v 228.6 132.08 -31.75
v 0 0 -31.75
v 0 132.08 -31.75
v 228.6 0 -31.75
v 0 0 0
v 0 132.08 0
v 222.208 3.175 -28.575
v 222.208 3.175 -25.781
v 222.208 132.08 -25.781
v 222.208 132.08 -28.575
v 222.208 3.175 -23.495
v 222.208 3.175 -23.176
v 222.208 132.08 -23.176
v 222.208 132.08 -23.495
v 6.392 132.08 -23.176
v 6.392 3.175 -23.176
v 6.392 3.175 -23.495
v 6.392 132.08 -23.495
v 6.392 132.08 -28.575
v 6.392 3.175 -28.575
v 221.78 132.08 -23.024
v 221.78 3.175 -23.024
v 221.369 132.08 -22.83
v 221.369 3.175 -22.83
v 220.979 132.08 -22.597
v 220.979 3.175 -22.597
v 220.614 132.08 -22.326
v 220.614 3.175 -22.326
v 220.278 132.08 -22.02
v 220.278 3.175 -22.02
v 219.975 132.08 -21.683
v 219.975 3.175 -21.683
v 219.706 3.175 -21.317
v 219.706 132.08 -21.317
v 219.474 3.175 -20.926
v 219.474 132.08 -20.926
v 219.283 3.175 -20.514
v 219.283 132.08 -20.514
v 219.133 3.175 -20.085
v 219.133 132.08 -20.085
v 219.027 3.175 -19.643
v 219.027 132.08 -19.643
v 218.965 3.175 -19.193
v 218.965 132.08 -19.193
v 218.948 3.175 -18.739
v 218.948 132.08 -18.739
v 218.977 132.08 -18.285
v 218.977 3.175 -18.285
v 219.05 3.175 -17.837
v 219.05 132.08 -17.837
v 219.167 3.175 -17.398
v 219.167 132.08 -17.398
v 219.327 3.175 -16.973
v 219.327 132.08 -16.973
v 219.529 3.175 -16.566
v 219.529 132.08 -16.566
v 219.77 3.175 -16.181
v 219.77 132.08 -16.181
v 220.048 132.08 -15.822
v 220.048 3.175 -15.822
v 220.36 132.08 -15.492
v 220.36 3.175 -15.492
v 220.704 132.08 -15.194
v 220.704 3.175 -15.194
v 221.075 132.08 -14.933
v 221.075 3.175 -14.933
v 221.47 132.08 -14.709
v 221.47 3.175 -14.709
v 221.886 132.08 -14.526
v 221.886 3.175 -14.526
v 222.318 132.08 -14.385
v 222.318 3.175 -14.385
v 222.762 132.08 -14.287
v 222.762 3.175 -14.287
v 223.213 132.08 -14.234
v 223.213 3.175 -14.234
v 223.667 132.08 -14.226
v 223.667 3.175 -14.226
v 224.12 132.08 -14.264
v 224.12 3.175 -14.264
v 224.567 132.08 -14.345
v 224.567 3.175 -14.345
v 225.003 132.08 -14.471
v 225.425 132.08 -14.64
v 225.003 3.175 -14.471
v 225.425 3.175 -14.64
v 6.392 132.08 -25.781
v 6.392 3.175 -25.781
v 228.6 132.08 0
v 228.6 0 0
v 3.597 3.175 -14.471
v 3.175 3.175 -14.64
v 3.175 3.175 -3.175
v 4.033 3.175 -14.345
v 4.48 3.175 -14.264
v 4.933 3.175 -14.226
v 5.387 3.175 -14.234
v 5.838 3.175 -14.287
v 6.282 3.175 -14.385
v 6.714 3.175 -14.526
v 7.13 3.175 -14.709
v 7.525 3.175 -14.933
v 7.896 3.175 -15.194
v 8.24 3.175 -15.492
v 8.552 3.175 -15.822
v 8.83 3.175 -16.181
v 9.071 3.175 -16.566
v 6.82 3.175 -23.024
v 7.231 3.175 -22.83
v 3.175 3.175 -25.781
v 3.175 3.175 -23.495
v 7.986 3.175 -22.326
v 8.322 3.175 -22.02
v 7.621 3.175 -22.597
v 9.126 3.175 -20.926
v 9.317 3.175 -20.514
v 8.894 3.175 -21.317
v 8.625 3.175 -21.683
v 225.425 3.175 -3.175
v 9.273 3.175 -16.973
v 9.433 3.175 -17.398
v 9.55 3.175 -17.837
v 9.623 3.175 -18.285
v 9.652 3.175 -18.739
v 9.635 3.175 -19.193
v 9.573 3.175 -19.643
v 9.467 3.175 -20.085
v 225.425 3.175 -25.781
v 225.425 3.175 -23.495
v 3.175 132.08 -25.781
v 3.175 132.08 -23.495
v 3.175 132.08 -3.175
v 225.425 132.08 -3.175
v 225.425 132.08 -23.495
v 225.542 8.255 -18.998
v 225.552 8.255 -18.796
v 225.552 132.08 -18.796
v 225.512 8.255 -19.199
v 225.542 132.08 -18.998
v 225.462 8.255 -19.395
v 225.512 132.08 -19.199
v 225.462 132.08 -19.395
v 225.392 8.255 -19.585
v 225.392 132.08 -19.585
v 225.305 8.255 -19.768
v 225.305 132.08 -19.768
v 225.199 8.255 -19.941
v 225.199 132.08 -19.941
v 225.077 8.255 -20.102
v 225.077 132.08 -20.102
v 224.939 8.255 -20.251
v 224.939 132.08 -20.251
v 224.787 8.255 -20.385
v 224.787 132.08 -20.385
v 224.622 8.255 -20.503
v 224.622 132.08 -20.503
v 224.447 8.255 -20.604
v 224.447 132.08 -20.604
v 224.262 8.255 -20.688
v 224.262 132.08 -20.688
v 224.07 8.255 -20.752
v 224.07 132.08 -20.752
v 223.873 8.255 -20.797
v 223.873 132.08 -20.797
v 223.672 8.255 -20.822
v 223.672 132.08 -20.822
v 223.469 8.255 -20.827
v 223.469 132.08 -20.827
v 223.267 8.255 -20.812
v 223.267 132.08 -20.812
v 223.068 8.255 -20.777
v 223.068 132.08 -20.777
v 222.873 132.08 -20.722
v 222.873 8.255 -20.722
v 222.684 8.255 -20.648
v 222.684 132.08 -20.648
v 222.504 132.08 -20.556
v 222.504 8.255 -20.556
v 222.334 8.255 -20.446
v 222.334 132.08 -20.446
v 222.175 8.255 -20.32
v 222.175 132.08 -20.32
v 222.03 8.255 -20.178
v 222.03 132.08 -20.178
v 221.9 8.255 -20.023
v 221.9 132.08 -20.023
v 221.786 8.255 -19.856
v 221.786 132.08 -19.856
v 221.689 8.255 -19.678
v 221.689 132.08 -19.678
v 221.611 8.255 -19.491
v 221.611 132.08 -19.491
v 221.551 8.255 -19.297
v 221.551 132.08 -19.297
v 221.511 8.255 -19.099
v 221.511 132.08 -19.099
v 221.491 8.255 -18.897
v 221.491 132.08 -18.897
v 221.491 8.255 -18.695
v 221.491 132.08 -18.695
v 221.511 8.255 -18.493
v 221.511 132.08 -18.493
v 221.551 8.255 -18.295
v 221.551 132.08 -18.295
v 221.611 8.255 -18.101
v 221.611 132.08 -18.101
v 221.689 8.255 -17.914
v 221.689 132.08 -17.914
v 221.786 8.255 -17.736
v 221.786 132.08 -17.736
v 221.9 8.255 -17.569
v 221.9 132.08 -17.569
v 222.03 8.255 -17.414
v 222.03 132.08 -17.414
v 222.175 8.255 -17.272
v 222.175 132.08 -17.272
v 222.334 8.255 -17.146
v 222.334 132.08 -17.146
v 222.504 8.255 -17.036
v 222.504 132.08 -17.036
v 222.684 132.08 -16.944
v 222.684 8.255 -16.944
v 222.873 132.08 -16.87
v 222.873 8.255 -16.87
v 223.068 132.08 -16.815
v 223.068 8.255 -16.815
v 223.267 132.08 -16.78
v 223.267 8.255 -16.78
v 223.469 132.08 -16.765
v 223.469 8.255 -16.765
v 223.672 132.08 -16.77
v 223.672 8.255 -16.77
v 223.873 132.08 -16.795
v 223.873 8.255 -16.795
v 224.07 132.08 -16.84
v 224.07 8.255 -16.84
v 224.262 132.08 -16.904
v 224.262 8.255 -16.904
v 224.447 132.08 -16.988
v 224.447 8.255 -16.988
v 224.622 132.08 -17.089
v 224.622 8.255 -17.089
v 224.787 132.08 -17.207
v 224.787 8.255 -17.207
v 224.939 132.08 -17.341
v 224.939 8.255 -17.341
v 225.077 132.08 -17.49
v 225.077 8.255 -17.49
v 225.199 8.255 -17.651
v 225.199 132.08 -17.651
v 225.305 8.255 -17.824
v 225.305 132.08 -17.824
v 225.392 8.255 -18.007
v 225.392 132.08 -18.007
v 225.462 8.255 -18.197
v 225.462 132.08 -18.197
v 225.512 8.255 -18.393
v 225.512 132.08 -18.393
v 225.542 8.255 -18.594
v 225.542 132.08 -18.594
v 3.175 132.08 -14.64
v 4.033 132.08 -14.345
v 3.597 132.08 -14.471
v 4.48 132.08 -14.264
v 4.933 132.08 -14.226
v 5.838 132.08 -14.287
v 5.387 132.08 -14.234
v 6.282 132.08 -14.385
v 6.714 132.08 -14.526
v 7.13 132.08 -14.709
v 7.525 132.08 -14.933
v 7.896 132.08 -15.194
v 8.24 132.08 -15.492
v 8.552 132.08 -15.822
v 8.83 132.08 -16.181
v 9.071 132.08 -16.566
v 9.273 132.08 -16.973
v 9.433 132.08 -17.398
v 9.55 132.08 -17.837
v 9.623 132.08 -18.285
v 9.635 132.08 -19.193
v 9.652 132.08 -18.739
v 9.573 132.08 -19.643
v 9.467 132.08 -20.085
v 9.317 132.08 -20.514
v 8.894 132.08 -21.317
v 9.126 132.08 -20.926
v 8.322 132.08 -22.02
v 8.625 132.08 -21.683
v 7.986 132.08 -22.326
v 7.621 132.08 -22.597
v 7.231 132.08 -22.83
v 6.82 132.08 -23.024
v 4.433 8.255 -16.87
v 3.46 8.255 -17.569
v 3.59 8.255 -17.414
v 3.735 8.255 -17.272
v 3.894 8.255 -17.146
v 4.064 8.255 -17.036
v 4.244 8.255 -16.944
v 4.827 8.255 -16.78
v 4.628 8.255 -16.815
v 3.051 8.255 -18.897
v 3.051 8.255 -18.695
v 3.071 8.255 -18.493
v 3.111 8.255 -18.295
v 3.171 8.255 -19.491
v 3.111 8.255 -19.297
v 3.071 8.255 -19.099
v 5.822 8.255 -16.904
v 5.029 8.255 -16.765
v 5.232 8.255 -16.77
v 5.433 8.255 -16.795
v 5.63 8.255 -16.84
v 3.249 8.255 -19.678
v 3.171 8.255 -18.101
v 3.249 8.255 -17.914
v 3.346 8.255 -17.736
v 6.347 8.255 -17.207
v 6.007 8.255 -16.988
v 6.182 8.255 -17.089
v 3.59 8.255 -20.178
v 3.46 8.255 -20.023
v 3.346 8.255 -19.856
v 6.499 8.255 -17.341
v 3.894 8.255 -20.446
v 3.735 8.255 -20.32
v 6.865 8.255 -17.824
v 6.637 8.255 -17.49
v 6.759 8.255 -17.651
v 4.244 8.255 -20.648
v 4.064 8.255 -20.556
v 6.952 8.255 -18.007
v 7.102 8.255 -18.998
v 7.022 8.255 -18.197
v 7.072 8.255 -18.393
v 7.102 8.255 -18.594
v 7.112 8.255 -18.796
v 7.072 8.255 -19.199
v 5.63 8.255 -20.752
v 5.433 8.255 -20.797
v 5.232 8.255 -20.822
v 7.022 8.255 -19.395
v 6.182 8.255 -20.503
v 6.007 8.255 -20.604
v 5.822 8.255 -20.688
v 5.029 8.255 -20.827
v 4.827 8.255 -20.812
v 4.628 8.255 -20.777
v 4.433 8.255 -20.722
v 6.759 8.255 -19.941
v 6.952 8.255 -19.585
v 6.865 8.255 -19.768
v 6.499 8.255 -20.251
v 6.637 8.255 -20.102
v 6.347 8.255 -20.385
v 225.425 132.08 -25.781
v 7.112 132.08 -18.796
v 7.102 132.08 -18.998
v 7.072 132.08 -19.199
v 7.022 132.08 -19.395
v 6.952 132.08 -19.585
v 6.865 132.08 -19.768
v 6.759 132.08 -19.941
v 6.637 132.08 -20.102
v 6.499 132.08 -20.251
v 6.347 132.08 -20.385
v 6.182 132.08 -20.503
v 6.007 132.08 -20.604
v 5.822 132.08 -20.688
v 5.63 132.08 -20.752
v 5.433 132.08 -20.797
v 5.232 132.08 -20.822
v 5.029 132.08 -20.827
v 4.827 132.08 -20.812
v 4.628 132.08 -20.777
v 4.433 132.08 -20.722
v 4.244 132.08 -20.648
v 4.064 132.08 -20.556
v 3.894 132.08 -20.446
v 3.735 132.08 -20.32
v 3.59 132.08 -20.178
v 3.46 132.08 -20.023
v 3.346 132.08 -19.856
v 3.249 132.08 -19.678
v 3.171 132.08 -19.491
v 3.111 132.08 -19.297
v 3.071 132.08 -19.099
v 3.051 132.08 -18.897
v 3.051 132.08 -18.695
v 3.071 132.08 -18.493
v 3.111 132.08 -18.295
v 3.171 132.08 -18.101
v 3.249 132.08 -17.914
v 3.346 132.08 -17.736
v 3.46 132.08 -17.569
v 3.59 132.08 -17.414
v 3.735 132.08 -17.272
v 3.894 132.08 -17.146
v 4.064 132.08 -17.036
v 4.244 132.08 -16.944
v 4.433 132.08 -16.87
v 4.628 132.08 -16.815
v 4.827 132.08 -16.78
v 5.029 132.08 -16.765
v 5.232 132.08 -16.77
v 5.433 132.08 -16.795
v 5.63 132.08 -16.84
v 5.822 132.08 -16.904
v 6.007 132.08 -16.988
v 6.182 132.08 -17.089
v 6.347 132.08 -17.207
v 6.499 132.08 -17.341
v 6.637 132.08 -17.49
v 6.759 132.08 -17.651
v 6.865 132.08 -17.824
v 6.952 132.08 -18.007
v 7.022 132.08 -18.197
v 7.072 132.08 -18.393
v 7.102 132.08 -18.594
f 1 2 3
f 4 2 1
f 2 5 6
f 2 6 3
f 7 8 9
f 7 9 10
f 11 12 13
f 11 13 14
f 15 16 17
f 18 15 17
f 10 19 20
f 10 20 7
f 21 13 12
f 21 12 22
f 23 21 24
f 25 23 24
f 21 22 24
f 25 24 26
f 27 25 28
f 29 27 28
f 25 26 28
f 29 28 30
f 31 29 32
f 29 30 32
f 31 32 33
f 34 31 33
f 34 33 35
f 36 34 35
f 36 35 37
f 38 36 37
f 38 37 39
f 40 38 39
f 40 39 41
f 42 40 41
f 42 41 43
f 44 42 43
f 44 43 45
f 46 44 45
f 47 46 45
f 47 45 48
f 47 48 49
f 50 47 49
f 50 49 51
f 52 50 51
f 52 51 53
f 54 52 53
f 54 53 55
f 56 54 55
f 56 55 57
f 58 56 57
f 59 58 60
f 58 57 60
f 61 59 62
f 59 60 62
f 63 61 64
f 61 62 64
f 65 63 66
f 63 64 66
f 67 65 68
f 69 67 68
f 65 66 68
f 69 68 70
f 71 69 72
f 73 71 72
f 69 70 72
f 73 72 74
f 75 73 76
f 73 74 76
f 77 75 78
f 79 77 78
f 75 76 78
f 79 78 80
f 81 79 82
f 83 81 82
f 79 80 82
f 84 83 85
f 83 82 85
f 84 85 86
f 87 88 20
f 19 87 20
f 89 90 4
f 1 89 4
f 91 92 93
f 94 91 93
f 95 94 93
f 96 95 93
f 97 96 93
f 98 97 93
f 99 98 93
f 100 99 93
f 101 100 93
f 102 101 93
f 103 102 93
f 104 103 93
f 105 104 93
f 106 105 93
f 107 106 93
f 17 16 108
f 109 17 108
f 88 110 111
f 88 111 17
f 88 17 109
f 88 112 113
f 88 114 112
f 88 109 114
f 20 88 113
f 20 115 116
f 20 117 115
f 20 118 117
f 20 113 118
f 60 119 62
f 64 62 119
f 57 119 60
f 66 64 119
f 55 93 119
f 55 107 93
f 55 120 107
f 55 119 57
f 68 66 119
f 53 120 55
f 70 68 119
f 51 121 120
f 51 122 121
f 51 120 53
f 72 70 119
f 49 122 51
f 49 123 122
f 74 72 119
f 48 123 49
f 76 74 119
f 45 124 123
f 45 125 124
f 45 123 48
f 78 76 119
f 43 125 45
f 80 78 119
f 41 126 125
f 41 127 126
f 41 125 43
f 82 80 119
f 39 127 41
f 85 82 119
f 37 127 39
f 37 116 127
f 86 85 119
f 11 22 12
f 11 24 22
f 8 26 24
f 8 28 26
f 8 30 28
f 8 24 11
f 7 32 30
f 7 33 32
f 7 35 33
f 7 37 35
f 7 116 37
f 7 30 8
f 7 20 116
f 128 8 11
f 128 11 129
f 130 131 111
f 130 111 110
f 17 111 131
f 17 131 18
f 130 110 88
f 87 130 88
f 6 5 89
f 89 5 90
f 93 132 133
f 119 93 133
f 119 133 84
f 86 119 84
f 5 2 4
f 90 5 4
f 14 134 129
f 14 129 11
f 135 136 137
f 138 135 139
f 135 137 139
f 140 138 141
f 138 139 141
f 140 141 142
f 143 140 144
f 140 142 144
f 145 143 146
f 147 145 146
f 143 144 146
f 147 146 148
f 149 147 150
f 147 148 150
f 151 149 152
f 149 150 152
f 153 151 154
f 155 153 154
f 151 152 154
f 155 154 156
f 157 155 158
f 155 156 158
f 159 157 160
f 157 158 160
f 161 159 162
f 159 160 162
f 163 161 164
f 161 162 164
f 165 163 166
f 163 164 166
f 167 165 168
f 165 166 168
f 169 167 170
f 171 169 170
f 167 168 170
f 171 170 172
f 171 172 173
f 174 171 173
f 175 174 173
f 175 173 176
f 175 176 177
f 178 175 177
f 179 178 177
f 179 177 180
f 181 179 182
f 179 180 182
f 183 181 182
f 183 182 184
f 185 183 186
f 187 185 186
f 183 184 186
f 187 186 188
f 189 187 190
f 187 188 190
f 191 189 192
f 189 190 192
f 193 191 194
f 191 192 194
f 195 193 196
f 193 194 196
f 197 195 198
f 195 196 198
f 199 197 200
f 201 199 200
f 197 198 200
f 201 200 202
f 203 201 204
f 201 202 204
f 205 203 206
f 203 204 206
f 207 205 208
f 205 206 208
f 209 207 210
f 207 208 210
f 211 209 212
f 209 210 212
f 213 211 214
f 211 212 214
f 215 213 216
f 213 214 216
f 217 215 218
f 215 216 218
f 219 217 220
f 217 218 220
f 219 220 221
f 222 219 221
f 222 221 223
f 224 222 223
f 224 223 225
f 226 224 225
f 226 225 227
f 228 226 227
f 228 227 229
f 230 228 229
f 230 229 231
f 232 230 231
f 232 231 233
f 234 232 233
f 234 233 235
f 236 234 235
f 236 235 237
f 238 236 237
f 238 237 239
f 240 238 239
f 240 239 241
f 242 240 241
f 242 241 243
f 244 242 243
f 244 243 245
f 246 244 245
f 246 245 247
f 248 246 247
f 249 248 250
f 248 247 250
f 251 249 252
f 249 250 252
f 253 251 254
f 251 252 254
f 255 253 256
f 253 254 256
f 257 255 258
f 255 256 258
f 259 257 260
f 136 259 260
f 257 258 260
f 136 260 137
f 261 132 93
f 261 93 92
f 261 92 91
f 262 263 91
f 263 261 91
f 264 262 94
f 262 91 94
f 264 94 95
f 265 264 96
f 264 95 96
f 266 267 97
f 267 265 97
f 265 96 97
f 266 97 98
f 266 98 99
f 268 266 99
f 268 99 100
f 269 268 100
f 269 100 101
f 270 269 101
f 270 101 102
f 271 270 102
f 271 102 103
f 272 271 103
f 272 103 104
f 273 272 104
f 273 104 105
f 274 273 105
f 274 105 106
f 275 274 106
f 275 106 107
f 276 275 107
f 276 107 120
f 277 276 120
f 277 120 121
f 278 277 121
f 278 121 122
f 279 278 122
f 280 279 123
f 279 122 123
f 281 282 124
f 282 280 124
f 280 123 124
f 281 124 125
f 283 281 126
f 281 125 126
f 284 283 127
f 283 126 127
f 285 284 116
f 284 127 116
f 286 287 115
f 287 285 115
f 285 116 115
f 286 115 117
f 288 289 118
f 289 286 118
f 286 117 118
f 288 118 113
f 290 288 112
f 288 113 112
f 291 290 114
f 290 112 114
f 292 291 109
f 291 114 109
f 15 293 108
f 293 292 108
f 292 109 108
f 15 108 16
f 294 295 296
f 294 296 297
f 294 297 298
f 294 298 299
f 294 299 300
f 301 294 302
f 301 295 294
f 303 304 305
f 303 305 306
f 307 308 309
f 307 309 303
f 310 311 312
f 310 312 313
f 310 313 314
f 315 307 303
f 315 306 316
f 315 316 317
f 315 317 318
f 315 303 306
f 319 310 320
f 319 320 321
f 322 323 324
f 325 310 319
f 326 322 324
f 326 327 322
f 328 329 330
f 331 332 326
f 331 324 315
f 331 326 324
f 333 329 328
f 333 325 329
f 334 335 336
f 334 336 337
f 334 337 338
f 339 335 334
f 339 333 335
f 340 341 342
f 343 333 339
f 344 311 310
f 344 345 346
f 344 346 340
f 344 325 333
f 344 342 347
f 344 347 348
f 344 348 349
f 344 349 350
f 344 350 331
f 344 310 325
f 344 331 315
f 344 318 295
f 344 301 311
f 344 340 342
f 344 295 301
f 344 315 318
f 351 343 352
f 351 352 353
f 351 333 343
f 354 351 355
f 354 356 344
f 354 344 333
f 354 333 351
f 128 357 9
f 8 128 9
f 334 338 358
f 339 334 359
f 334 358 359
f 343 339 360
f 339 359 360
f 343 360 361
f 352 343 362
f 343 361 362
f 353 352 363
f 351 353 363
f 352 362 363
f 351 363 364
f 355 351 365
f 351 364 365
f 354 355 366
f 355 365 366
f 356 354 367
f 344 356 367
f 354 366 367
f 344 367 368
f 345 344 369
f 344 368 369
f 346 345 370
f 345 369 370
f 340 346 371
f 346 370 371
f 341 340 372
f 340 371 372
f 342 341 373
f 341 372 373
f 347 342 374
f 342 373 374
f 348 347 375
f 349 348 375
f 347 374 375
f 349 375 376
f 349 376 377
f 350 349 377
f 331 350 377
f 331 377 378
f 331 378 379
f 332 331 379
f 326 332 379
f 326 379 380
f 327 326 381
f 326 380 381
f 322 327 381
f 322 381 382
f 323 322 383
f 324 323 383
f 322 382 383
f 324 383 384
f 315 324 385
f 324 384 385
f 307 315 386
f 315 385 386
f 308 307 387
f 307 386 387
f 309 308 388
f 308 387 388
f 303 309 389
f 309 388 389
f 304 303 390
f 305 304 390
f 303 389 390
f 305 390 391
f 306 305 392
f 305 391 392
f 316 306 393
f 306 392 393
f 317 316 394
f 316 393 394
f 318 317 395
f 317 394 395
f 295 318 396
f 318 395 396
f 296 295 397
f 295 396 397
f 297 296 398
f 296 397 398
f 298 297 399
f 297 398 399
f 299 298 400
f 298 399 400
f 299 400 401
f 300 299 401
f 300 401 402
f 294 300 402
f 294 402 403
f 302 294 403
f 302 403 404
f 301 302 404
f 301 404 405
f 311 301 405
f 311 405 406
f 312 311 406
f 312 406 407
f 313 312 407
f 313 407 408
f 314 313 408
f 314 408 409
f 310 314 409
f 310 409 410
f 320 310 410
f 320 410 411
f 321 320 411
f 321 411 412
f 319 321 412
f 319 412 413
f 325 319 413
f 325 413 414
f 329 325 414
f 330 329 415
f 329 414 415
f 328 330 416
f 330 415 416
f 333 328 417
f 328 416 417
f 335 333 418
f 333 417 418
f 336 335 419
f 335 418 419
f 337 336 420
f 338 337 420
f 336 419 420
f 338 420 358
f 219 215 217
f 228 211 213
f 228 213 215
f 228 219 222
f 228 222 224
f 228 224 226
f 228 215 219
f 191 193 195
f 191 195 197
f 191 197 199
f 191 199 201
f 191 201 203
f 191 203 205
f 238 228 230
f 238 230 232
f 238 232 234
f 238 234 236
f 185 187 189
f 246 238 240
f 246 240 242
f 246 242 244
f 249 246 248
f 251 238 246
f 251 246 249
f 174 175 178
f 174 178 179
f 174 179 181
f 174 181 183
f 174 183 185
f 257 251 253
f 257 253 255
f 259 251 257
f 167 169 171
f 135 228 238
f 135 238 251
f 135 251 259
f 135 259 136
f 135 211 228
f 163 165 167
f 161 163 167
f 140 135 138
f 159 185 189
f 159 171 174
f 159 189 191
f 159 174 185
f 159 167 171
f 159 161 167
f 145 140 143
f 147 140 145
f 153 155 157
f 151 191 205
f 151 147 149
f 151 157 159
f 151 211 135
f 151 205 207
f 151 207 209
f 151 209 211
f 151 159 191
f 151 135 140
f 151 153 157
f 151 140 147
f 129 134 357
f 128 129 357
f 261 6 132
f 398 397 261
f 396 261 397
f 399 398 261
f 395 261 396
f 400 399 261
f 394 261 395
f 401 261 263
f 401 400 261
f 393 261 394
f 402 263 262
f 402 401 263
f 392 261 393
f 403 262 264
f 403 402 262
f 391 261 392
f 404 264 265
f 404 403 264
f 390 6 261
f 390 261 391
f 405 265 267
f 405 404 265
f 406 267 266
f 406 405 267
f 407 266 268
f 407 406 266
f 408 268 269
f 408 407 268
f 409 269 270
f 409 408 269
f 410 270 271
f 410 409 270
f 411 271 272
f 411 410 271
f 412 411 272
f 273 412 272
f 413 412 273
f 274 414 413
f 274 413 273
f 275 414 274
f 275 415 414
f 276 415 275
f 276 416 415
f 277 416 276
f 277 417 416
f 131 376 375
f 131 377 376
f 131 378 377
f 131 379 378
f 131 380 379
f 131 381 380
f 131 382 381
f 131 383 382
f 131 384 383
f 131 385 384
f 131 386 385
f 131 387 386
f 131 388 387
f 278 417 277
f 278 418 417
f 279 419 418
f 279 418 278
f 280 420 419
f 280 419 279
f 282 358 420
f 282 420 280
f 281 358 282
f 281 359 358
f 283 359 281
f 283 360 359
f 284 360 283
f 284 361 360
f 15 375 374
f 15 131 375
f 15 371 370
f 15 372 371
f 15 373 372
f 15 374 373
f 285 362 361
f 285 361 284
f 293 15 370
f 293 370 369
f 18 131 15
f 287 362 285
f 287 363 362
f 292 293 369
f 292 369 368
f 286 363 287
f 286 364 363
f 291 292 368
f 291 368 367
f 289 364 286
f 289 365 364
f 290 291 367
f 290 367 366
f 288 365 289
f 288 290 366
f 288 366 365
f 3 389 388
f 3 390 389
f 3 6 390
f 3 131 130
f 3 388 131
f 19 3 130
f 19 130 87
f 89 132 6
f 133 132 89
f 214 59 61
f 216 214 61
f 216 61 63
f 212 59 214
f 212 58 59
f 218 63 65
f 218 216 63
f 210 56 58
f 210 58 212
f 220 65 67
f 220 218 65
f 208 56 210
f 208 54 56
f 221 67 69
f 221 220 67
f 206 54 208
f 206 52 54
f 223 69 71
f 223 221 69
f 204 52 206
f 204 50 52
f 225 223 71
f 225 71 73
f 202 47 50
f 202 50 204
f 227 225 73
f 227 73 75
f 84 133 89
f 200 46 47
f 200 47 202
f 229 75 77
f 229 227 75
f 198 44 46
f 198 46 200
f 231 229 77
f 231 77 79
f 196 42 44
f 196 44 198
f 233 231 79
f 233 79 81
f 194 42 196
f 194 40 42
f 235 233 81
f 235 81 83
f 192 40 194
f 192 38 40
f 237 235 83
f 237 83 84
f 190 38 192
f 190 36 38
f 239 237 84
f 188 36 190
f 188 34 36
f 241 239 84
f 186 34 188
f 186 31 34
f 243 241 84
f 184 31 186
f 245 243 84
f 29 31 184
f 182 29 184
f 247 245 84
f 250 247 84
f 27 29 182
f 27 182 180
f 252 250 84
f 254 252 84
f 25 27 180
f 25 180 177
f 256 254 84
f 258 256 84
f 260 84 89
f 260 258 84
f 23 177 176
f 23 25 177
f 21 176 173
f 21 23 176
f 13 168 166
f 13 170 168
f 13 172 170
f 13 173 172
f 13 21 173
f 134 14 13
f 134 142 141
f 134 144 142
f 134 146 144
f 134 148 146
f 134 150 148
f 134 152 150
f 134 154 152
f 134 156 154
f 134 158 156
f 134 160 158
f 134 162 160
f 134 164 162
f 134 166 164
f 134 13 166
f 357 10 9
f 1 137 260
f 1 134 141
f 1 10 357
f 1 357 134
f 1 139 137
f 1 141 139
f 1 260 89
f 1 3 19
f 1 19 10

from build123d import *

# Parameters (mm, degrees)
SKETCH1_W           = 228.6
SKETCH1_H           = 31.75
BOSS_EXTRUDE1_DEPTH = 132.08
SKETCH2_W           = 222.25
SKETCH2_H           = 25.4
CUT_EXTRUDE1_DEPTH  = 128.905
SKETCH3_W           = 3.216999687
SKETCH3_H           = 4.15103562
SKETCH3_H_2         = 5.08
BOSS_EXTRUDE2_DEPTH = 128.905
SKETCH4_R           = 4.572
BOSS_EXTRUDE3_DEPTH = 128.905
SKETCH5_R           = 2.032
CUT_EXTRUDE2_DEPTH  = 123.825


with BuildPart() as part:
    # Sketch1 → Boss-Extrude1 (new body)
    with BuildSketch(Plane(origin=(0, 0, 0), x_dir=(1, 0, 0), z_dir=(0, 1, 0))):
        with Locations((114.3, 15.875)):
            Rectangle(SKETCH1_W, SKETCH1_H)
    extrude(amount=BOSS_EXTRUDE1_DEPTH)

    # Sketch2 → Cut-Extrude1 (cut)
    with BuildSketch(Plane(origin=(0, 132.08, 0), x_dir=(1, 0, 0), z_dir=(0, 1, 0))):
        with Locations((114.3, 15.875)):
            Rectangle(SKETCH2_W, SKETCH2_H)
    extrude(amount=-CUT_EXTRUDE1_DEPTH, mode=Mode.SUBTRACT)

    # Sketch3 → Boss-Extrude2 (add)
    with BuildSketch(Plane(origin=(0, 3.175, 0), x_dir=(1, 0, 0), z_dir=(0, 1, 0))):
        with Locations((4.783499844, 27.85651781)):
            Rectangle(SKETCH3_W, SKETCH3_H)
        with Locations((4.783499844, 20.955)):
            Rectangle(SKETCH3_W, SKETCH3_H_2)
    boss_extrude2 = extrude(amount=BOSS_EXTRUDE2_DEPTH)

    # Mirror1: Boss-Extrude2 across plane
    add(boss_extrude2.mirror(Plane.ZY.offset(-114.3)))

    # Sketch4 → Boss-Extrude3 (add)
    with BuildSketch(Plane(origin=(0, 3.175, 0), x_dir=(1, 0, 0), z_dir=(0, 1, 0))):
        with Locations((5.08, 18.796)):
            Circle(SKETCH4_R)
        with Locations((223.52, 18.796)):
            Circle(SKETCH4_R)
    extrude(amount=BOSS_EXTRUDE3_DEPTH)

    # Sketch5 → Cut-Extrude2 (cut)
    with BuildSketch(Plane(origin=(0, 132.08, 0), x_dir=(1, 0, 0), z_dir=(0, 1, 0))):
        with Locations((5.08, 18.796)):
            Circle(SKETCH5_R)
        with Locations((223.52, 18.796)):
            Circle(SKETCH5_R)
    extrude(amount=-CUT_EXTRUDE2_DEPTH, mode=Mode.SUBTRACT)


solid = part.part
